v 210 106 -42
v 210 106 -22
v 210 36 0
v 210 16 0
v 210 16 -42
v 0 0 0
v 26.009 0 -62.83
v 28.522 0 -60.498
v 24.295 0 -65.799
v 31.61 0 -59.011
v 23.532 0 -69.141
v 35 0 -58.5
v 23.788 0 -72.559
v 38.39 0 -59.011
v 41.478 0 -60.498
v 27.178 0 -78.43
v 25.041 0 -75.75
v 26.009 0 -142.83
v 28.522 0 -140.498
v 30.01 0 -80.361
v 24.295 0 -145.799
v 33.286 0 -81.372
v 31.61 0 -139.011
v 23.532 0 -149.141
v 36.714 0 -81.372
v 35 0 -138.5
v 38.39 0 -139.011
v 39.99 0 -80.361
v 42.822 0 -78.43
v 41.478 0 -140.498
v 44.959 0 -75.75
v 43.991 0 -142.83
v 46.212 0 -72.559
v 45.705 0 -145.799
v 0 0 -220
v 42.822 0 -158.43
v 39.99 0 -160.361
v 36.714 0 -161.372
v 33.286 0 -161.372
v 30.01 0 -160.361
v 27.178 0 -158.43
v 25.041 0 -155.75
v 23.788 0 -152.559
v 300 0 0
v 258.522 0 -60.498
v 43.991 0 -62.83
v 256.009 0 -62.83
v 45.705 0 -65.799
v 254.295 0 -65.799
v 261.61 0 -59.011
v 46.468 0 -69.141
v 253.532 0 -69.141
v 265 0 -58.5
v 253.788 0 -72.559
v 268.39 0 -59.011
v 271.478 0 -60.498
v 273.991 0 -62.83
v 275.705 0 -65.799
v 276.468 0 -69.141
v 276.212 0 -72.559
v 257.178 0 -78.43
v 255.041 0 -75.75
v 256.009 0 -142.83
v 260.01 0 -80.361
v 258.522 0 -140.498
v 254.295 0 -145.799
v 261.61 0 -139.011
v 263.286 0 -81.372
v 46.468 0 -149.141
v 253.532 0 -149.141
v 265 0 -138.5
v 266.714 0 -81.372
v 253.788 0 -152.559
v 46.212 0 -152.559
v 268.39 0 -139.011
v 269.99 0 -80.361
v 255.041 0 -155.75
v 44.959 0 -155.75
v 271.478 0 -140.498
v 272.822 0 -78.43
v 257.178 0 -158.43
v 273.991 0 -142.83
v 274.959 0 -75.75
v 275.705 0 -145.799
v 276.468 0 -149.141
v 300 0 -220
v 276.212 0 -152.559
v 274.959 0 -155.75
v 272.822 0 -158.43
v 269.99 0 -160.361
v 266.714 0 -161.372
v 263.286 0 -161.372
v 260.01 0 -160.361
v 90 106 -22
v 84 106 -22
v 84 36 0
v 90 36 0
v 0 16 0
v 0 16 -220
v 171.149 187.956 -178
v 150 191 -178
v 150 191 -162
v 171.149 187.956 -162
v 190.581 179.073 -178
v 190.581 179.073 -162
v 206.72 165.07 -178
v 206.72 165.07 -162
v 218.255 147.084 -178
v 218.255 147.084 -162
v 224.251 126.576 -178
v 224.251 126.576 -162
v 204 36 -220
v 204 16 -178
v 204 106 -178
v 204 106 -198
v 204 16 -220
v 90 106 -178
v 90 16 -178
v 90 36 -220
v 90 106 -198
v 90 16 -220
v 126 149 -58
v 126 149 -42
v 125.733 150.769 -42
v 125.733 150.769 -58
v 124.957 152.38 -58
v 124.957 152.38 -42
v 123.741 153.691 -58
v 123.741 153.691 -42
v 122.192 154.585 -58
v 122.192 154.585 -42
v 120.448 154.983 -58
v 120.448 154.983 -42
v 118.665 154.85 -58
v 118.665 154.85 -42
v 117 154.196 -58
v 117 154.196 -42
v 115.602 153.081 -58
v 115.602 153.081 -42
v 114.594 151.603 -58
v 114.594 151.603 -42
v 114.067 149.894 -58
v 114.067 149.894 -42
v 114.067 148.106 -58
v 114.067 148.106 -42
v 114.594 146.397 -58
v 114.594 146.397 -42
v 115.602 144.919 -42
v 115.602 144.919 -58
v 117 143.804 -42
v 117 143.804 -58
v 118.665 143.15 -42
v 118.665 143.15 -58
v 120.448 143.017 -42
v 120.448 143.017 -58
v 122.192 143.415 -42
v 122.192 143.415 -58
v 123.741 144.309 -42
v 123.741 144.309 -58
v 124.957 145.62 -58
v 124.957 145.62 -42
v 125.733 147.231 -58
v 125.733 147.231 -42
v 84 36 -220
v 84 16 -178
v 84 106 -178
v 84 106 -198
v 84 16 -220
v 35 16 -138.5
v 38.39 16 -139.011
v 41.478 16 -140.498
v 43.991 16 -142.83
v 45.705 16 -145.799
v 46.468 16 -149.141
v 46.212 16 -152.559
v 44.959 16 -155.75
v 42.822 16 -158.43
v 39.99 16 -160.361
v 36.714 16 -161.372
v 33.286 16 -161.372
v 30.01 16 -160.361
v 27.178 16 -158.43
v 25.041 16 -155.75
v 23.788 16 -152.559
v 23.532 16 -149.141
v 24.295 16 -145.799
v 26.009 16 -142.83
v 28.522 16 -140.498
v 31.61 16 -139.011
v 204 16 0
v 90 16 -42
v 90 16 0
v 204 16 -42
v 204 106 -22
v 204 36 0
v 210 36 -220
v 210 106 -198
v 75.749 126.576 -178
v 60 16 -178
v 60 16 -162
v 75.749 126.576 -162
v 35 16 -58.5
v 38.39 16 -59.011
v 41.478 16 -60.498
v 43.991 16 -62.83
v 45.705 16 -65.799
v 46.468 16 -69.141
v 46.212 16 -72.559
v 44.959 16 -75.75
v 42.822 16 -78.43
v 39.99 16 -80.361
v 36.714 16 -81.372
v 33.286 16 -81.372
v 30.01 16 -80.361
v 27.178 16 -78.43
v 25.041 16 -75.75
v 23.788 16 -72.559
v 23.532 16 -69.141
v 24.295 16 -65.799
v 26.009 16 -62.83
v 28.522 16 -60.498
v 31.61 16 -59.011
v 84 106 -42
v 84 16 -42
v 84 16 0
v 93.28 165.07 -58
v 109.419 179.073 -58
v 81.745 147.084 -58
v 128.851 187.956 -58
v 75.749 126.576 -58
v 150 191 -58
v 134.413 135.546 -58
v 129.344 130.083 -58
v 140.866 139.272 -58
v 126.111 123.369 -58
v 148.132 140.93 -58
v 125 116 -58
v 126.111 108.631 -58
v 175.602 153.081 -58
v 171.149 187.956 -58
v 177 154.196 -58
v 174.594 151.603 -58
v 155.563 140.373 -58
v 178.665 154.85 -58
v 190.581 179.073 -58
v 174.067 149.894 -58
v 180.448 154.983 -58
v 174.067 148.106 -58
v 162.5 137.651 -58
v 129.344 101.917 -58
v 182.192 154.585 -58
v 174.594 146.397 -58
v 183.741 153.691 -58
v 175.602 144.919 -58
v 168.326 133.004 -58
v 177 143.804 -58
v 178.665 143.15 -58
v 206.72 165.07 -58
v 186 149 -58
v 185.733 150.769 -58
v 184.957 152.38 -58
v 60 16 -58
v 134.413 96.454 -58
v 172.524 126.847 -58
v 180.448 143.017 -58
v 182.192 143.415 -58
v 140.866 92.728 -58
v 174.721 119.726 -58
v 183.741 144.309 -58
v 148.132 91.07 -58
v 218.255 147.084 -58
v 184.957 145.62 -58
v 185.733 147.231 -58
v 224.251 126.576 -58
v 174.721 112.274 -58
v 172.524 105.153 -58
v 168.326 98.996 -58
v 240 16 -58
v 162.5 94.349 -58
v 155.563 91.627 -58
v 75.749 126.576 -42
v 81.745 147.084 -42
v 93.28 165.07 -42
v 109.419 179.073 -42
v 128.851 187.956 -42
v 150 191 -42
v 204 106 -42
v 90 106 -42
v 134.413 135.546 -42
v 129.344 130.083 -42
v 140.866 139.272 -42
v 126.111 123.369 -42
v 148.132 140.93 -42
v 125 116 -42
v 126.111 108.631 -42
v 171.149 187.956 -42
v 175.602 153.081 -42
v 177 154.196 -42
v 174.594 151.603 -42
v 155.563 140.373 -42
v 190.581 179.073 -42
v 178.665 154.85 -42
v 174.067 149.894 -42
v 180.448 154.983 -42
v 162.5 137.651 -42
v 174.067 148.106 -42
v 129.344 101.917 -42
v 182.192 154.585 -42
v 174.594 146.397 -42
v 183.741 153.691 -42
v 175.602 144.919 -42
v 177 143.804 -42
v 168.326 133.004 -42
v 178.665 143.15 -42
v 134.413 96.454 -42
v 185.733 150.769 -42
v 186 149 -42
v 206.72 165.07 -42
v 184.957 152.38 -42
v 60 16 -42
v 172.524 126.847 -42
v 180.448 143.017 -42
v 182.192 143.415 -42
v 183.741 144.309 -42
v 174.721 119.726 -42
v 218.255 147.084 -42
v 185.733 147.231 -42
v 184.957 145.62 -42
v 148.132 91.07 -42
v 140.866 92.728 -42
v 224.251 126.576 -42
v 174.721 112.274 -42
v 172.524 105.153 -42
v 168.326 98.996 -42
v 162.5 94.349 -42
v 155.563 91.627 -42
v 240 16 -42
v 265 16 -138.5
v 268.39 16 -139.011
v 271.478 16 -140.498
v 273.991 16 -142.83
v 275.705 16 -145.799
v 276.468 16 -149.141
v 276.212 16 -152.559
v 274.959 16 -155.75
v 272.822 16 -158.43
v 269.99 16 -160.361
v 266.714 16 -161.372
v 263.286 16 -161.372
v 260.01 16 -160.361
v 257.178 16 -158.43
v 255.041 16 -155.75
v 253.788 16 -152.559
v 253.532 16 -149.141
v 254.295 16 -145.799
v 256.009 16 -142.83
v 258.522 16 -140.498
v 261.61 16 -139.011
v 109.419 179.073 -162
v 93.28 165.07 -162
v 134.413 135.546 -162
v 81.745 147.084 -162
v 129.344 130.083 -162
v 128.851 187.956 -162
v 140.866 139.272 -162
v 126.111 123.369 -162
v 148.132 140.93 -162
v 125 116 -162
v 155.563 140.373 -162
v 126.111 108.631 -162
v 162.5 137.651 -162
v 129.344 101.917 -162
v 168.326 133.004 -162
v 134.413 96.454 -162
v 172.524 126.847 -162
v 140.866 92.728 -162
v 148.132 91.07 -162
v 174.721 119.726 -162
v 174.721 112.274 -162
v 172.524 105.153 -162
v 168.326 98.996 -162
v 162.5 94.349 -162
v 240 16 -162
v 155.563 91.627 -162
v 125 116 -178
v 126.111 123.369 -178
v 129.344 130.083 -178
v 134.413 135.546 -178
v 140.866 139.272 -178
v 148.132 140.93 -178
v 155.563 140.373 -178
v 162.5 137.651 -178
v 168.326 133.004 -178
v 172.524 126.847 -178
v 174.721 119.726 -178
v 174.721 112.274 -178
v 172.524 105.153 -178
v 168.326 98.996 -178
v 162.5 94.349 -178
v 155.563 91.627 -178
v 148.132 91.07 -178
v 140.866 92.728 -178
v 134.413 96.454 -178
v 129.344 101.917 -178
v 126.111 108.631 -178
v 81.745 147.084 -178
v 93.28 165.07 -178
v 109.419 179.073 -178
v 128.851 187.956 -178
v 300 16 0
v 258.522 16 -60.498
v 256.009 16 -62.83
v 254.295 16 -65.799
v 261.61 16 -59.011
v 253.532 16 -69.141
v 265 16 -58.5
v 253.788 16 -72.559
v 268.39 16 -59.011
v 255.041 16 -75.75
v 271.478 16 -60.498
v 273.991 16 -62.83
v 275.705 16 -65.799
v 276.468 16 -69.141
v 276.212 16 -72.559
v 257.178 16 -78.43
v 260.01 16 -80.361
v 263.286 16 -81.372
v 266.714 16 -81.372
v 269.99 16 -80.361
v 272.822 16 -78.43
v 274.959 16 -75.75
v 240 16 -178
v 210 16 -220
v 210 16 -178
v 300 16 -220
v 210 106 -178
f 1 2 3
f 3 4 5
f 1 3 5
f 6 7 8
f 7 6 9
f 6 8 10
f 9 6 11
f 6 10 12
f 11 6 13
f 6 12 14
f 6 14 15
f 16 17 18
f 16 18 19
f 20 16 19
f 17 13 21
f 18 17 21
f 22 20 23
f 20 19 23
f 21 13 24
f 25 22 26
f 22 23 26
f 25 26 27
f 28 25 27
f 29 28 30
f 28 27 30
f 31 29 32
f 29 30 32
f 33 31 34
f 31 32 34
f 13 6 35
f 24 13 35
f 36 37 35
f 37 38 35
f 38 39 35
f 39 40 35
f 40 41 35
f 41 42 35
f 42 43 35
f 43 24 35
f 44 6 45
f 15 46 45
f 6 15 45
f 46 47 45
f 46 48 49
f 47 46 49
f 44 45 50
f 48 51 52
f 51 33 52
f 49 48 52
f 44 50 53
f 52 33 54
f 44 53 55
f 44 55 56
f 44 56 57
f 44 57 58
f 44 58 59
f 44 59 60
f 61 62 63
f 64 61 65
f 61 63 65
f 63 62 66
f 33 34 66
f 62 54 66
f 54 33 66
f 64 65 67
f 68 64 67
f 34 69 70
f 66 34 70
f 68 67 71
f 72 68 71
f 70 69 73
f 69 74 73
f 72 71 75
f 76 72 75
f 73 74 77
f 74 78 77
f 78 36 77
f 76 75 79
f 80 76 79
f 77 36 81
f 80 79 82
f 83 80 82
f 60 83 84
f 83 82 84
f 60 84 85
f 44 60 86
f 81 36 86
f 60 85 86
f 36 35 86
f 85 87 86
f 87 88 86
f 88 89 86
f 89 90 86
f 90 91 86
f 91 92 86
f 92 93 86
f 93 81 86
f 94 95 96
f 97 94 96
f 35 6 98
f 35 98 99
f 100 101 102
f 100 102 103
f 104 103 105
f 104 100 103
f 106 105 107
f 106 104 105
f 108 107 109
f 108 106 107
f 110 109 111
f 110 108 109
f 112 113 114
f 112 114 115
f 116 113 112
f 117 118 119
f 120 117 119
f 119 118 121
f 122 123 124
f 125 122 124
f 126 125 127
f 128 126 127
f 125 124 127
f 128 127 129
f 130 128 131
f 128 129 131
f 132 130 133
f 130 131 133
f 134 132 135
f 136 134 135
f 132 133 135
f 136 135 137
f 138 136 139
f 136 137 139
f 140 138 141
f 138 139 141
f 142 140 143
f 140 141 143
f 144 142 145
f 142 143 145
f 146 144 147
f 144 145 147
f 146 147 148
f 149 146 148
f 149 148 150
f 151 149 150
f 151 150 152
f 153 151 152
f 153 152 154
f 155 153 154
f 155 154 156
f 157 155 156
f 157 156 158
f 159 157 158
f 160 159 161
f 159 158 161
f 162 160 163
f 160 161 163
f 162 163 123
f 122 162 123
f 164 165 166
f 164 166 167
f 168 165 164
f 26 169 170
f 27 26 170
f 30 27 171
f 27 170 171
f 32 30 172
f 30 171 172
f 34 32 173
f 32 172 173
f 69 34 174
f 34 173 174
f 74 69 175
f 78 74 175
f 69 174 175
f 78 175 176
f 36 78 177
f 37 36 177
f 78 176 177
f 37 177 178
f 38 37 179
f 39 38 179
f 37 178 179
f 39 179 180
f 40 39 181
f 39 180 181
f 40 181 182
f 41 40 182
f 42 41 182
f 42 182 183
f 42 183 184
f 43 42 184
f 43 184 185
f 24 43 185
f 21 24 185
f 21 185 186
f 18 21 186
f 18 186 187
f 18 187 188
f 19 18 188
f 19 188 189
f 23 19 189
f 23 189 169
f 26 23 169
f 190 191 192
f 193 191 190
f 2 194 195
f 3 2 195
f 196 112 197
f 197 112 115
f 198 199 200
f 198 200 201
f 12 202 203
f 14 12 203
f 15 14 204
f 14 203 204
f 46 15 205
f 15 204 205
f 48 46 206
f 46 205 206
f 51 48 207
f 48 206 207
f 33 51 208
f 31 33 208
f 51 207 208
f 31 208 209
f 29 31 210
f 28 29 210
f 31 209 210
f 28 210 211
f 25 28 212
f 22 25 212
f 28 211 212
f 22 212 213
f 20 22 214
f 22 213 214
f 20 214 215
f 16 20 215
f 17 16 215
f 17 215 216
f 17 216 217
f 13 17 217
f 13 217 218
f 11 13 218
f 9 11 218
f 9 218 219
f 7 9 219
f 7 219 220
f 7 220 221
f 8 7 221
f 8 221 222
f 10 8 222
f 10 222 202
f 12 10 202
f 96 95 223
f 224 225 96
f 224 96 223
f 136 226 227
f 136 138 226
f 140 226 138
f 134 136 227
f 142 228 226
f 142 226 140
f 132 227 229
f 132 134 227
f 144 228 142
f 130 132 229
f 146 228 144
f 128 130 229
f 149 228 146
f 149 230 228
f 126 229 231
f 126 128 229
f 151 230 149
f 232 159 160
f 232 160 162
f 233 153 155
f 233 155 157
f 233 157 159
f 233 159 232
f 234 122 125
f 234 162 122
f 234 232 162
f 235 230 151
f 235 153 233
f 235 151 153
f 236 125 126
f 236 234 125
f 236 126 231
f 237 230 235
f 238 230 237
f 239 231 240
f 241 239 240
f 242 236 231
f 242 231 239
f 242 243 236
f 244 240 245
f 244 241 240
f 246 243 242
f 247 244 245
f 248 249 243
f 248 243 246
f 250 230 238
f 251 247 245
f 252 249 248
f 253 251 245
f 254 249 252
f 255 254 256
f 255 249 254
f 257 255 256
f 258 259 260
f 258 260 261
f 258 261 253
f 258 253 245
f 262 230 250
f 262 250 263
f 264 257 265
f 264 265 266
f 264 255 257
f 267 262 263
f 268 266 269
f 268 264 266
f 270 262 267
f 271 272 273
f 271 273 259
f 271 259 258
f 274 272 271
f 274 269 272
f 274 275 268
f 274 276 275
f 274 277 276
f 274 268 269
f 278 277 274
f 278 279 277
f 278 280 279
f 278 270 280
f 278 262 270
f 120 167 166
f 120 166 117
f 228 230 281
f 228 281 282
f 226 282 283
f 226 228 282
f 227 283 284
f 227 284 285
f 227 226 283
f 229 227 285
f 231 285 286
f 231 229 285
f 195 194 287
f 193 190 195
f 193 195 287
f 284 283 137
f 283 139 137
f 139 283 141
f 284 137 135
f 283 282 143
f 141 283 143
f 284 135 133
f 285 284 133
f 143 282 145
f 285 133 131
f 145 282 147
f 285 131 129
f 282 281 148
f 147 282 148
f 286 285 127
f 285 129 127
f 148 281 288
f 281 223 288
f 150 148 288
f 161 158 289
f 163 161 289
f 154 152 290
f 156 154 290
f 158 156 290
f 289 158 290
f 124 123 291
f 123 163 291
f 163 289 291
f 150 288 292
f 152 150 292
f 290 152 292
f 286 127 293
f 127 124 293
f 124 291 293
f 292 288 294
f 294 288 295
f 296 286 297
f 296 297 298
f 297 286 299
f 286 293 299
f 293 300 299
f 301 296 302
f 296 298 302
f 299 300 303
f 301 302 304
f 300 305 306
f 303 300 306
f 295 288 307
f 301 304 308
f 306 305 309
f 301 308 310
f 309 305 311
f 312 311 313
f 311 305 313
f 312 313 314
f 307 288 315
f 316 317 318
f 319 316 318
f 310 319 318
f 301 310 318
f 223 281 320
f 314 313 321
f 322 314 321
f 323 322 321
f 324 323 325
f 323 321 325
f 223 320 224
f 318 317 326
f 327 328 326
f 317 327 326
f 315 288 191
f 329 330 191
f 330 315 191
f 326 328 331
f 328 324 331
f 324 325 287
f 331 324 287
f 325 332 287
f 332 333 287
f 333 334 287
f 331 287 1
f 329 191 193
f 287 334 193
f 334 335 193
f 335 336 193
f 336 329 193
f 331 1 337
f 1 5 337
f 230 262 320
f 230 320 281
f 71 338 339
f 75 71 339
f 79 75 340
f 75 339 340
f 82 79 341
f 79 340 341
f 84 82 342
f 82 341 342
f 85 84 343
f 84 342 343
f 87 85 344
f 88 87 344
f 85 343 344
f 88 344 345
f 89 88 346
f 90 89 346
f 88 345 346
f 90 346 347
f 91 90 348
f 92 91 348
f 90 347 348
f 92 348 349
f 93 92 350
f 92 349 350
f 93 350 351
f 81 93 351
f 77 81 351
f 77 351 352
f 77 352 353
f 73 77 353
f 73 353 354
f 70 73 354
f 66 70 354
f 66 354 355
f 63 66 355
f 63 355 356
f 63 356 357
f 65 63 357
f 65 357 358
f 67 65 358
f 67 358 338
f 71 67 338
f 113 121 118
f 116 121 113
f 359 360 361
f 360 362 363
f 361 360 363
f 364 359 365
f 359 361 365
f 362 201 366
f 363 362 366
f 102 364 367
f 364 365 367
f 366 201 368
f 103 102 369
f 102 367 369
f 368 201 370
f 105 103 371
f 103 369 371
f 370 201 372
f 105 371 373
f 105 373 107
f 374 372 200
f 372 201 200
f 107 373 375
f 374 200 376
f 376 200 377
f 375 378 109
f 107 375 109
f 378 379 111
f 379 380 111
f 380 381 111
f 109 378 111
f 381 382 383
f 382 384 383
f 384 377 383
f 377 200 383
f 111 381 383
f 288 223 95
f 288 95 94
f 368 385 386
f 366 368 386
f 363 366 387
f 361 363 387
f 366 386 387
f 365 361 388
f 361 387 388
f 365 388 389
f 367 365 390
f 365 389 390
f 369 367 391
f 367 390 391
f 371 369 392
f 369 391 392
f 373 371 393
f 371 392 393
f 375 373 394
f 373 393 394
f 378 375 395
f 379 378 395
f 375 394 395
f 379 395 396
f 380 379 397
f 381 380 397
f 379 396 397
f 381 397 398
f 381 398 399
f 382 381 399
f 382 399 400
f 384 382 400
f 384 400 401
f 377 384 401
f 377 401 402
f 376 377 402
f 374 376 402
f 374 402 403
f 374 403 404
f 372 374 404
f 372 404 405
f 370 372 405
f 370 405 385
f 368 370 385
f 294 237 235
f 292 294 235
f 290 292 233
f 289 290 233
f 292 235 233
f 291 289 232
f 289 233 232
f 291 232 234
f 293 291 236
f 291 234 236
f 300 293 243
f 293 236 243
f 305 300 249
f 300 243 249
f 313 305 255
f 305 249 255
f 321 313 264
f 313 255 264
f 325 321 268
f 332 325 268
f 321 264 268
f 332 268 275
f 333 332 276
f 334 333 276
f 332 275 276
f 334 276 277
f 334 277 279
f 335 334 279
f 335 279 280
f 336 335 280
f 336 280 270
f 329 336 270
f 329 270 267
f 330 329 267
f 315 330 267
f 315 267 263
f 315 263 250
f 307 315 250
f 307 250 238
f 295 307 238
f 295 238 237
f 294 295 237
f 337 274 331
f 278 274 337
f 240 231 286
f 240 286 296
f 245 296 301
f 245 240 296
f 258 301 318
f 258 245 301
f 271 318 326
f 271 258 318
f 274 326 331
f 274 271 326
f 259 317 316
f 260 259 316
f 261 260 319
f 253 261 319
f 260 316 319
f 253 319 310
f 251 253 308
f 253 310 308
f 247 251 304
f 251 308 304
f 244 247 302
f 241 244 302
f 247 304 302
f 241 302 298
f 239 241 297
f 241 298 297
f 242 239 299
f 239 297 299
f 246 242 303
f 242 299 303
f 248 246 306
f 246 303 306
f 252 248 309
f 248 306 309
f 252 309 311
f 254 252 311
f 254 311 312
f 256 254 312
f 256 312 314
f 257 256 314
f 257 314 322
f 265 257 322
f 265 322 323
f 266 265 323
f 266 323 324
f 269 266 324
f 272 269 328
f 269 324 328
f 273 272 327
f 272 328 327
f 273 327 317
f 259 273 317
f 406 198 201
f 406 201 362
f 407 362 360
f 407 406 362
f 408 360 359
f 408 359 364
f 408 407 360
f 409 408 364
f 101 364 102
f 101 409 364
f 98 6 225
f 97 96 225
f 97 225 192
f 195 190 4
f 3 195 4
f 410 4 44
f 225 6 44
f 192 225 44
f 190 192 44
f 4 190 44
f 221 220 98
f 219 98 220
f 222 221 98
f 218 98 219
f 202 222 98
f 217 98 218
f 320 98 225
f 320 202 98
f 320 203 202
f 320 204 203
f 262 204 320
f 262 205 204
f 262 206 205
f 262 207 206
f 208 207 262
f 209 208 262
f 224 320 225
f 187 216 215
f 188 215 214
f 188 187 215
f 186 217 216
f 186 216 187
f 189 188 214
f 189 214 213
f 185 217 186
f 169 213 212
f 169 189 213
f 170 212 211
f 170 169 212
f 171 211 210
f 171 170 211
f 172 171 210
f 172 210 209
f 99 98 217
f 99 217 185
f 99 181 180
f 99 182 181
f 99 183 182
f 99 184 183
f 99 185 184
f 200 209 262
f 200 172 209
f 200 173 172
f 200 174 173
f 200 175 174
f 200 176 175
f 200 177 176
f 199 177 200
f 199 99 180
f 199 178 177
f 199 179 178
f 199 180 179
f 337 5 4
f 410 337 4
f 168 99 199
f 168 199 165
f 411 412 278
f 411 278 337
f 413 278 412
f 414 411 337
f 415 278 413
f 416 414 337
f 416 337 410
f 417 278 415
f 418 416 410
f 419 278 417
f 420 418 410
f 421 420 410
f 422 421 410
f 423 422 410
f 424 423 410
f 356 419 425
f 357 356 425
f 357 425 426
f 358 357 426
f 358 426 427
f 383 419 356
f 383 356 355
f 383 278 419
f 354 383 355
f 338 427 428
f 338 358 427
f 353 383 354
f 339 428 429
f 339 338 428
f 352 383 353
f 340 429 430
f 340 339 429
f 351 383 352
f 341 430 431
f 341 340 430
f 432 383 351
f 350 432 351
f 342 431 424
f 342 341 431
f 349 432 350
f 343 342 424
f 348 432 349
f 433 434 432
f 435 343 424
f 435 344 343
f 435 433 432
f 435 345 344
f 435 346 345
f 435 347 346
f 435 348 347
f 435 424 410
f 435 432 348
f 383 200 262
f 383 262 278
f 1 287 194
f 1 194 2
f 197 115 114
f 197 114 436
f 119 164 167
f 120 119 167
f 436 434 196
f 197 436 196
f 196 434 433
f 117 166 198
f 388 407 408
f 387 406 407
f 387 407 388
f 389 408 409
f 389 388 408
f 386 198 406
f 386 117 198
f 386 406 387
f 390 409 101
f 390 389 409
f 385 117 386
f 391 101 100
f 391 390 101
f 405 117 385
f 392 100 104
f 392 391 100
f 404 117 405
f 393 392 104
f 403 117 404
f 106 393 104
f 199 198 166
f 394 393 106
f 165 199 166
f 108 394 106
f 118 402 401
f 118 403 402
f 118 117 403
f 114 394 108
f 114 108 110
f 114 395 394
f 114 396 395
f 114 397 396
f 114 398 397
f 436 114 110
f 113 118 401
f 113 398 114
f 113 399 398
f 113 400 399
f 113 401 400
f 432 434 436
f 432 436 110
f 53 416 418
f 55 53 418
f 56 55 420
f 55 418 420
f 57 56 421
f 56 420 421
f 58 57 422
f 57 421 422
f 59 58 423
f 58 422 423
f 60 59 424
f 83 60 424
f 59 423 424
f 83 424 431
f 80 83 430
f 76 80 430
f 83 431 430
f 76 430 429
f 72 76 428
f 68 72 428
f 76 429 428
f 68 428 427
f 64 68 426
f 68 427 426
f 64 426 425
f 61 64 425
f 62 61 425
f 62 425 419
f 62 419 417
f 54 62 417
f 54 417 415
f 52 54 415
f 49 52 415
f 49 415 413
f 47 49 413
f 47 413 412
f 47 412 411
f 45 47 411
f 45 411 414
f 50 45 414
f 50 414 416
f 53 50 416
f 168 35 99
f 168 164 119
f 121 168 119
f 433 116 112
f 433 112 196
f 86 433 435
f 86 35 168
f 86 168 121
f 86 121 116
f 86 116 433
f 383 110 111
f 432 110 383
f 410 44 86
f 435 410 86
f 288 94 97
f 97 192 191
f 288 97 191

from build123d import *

# Parameters (mm, degrees)
SKETCH_1_W                  = 300
SKETCH_1_H                  = 220
EXTRUDE_1_DEPTH             = 16
SKETCH_2_R                  = 11.5
CUT_EXTRUDE_1_DEPTH         = 373.365411928
PATTERN_LINEAR_1_COUNT      = 2
PATTERN_LINEAR_1_PITCH      = 230
PATTERN_LINEAR_1_COUNT_DIR2 = 2
PATTERN_LINEAR_1_PITCH_DIR2 = 80
SKETCH_3_W                  = 180
SKETCH_3_H                  = 16
EXTRUDE_2_DEPTH             = 175
CUT_EXTRUDE_2_DEPTH         = 398.699635403
CUT_EXTRUDE_3_DEPTH         = 398.699635403
SKETCH_8_R                  = 25
CUT_EXTRUDE_4_DEPTH         = 398.699635403
PATTERN_LINEAR_3_COUNT      = 2
PATTERN_LINEAR_3_PITCH      = 120
SKETCH_9_R                  = 6
CUT_EXTRUDE_5_DEPTH         = 16
PATTERN_LINEAR_4_COUNT      = 2
PATTERN_LINEAR_4_PITCH      = 60
SKETCH_10_W                 = 6
SKETCH_10_H                 = 42
EXTRUDE_3_DEPTH             = 90
PATTERN_LINEAR_5_COUNT      = 2
PATTERN_LINEAR_5_PITCH      = 120
PATTERN_LINEAR_5_COUNT_DIR2 = 2
PATTERN_LINEAR_5_PITCH_DIR2 = 178
CUT_EXTRUDE_6_DEPTH         = 363.680299989


with BuildPart() as part:
    # 草图1 → 凸台-拉伸1 (new body)
    with BuildSketch(Plane(origin=(0, 0, 0), x_dir=(1, 0, 0), z_dir=(0, 1, 0))):
        with Locations((150, 110)):
            Rectangle(SKETCH_1_W, SKETCH_1_H)
    extrude(amount=EXTRUDE_1_DEPTH)

    # 草图2 → 切除-拉伸1 (cut, through all)
    with BuildSketch(Plane(origin=(0, 16, 0), x_dir=(1, 0, 0), z_dir=(0, 1, 0))):
        with Locations(Location((35, 150, 0), (0, 0, 270))):
            Circle(SKETCH_2_R)
    cut_extrude_1 = extrude(amount=-CUT_EXTRUDE_1_DEPTH, mode=Mode.SUBTRACT)

    # 阵列(线性)1: Cut-Extrude 1 2 × 2
    with Locations(*[(i * PATTERN_LINEAR_1_PITCH, 0, j * PATTERN_LINEAR_1_PITCH_DIR2) for i in range(PATTERN_LINEAR_1_COUNT) for j in range(PATTERN_LINEAR_1_COUNT_DIR2) if (i, j) != (0, 0)]):
        add(cut_extrude_1, mode=Mode.SUBTRACT)

    # 草图3 → 凸台-拉伸2 (add)
    with BuildSketch(Plane(origin=(0, 16, 0), x_dir=(1, 0, 0), z_dir=(0, 1, 0))):
        with Locations((150, 170)):
            Rectangle(SKETCH_3_W, SKETCH_3_H)
    extrude_2 = extrude(amount=EXTRUDE_2_DEPTH)

    # 草图5 → 切除-拉伸2 (cut, through all)
    with BuildSketch(Plane(origin=(0, 0, -178), x_dir=(-1, 0, 0), z_dir=(0, 0, -1))):
        with BuildLine():
            Line((-60, 16), (-75.749362078, 126.57557413))
            ThreePointArc((-75.749362078, 126.57557413), (-100.848031879, 172.648777832), (-150, 191))
            Line((-150, 191), (-60, 191))
            Line((-60, 191), (-60, 16))
        make_face()
    cut_extrude_2 = extrude(amount=-CUT_EXTRUDE_2_DEPTH, mode=Mode.SUBTRACT)

    # 草图7 → 切除-拉伸3 (cut, through all)
    with BuildSketch(Plane(origin=(0, 0, -178), x_dir=(-1, 0, 0), z_dir=(0, 0, -1))):
        with BuildLine():
            Line((-224.250637922, 126.57557413), (-240, 16))
            Line((-240, 16), (-240, 191))
            Line((-240, 191), (-150, 191))
            ThreePointArc((-150, 191), (-199.151968121, 172.648777832), (-224.250637922, 126.57557413))
        make_face()
    cut_extrude_3 = extrude(amount=-CUT_EXTRUDE_3_DEPTH, mode=Mode.SUBTRACT)

    # 草图8 → 切除-拉伸4 (cut, through all)
    with BuildSketch(Plane(origin=(0, 0, -178), x_dir=(-1, 0, 0), z_dir=(0, 0, -1))):
        with Locations((-150, 116)):
            Circle(SKETCH_8_R)
    cut_extrude_4 = extrude(amount=-CUT_EXTRUDE_4_DEPTH, mode=Mode.SUBTRACT)

    # 阵列(线性)3: 凸台-拉伸2, 切除-拉伸2, 切除-拉伸3, 切除-拉伸4 ×2
    with Locations(*[(0, 0, i * PATTERN_LINEAR_3_PITCH) for i in range(1, PATTERN_LINEAR_3_COUNT)]):
        add(extrude_2)
        add(cut_extrude_2, mode=Mode.SUBTRACT)
        add(cut_extrude_3, mode=Mode.SUBTRACT)
        add(cut_extrude_4, mode=Mode.SUBTRACT)

    # 草图9 → 切除-拉伸5 (cut)
    with BuildSketch(Plane.XY.offset(-42)):
        with Locations((120, 149)):
            Circle(SKETCH_9_R)
    cut_extrude_5 = extrude(amount=-CUT_EXTRUDE_5_DEPTH, mode=Mode.SUBTRACT)

    # 阵列(线性)4: 切除-拉伸5 ×2
    with Locations(*[(i * PATTERN_LINEAR_4_PITCH, 0, 0) for i in range(1, PATTERN_LINEAR_4_COUNT)]):
        add(cut_extrude_5, mode=Mode.SUBTRACT)

    # 草图10 → 凸台-拉伸3 (add)
    with BuildSketch(Plane(origin=(0, 16, 0), x_dir=(1, 0, 0), z_dir=(0, 1, 0))):
        with Locations((87, 21)):
            Rectangle(SKETCH_10_W, SKETCH_10_H)
    extrude_3 = extrude(amount=EXTRUDE_3_DEPTH)

    # 阵列(线性)5: Extrude 3 2 × 2
    with Locations(*[(i * PATTERN_LINEAR_5_PITCH, 0, -j * PATTERN_LINEAR_5_PITCH_DIR2) for i in range(PATTERN_LINEAR_5_COUNT) for j in range(PATTERN_LINEAR_5_COUNT_DIR2) if (i, j) != (0, 0)]):
        add(extrude_3)

    # 草图11 → 切除-拉伸6 (cut, through all)
    with BuildSketch(Plane.ZY.offset(-84)):
        Polygon((0, 106), (-22, 106), (0, 36), align=None)
        Polygon((-220, 106), (-220, 36), (-198, 106), align=None)
    extrude(amount=-CUT_EXTRUDE_6_DEPTH, mode=Mode.SUBTRACT)


solid = part.part
